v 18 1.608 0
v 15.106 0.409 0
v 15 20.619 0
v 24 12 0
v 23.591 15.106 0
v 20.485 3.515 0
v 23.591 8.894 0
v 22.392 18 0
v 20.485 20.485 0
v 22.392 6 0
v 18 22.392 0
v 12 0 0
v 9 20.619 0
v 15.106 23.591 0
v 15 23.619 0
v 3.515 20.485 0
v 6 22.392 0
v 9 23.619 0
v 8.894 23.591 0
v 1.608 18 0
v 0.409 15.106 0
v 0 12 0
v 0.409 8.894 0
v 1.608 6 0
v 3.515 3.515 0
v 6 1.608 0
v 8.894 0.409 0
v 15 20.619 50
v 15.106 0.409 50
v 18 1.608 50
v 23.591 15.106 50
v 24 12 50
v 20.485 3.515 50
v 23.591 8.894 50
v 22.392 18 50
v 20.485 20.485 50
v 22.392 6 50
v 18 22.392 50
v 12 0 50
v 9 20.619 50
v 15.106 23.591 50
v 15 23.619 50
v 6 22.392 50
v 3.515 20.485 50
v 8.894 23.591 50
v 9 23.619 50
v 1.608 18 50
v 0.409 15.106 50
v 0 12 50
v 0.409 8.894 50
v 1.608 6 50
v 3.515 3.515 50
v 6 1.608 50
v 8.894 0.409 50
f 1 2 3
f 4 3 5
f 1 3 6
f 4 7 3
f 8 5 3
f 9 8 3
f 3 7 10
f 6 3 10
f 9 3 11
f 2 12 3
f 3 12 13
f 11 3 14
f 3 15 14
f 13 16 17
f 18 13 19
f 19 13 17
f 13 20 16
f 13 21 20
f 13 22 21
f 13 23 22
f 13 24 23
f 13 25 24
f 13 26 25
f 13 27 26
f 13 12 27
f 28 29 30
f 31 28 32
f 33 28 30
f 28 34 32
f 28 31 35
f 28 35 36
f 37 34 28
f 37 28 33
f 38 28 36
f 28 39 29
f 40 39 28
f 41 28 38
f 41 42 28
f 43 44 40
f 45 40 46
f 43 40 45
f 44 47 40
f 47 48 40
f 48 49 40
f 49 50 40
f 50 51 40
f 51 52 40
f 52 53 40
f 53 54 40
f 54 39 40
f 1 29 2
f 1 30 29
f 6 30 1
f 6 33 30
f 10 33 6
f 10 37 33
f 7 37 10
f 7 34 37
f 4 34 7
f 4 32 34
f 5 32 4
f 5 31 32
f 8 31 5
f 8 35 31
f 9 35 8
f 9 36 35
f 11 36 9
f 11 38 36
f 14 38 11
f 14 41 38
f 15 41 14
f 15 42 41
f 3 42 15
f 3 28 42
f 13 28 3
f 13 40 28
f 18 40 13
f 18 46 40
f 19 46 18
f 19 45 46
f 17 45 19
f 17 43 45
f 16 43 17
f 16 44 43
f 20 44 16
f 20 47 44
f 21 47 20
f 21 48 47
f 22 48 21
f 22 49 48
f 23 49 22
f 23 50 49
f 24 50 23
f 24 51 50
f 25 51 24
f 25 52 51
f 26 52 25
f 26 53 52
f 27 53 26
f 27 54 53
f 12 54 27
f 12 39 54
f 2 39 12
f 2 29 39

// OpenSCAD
$fn = 32;

// ----------------------------------------------------------------------
// Keyway shaft: d24 shaft, key 6 x 3 mm
// ----------------------------------------------------------------------

// --- parameters (mm) ---
shaft_r = 12;             // shaft radius
key_w = 6;                // keyway width
key_d = 3;                // keyway depth below the surface line
plate_t = 50;             // shaft length, Z (extrusion height)

shaft_d = 2 * shaft_r;  // shaft diameter
circle_step = 15;  // polygon sampling step, degrees

profile = [[8.894, 23.591], [6, 22.392], [3.515, 20.485], [1.608, 18], [0.409, 15.106], [0, 12], [0.409, 8.894], [1.608, 6], [3.515, 3.515], [6, 1.608], [8.894, 0.409], [12, 0], [15.106, 0.409], [18, 1.608], [20.485, 3.515], [22.392, 6], [23.591, 8.894], [24, 12], [23.591, 15.106], [22.392, 18], [20.485, 20.485], [18, 22.392], [15.106, 23.591], [15, 23.619], [15, 20.619], [9, 20.619], [9, 23.619]];  // primary outline, 27 points, counter clockwise

// --- the one profile operation ---
linear_extrude(height = plate_t) polygon(points = profile);
